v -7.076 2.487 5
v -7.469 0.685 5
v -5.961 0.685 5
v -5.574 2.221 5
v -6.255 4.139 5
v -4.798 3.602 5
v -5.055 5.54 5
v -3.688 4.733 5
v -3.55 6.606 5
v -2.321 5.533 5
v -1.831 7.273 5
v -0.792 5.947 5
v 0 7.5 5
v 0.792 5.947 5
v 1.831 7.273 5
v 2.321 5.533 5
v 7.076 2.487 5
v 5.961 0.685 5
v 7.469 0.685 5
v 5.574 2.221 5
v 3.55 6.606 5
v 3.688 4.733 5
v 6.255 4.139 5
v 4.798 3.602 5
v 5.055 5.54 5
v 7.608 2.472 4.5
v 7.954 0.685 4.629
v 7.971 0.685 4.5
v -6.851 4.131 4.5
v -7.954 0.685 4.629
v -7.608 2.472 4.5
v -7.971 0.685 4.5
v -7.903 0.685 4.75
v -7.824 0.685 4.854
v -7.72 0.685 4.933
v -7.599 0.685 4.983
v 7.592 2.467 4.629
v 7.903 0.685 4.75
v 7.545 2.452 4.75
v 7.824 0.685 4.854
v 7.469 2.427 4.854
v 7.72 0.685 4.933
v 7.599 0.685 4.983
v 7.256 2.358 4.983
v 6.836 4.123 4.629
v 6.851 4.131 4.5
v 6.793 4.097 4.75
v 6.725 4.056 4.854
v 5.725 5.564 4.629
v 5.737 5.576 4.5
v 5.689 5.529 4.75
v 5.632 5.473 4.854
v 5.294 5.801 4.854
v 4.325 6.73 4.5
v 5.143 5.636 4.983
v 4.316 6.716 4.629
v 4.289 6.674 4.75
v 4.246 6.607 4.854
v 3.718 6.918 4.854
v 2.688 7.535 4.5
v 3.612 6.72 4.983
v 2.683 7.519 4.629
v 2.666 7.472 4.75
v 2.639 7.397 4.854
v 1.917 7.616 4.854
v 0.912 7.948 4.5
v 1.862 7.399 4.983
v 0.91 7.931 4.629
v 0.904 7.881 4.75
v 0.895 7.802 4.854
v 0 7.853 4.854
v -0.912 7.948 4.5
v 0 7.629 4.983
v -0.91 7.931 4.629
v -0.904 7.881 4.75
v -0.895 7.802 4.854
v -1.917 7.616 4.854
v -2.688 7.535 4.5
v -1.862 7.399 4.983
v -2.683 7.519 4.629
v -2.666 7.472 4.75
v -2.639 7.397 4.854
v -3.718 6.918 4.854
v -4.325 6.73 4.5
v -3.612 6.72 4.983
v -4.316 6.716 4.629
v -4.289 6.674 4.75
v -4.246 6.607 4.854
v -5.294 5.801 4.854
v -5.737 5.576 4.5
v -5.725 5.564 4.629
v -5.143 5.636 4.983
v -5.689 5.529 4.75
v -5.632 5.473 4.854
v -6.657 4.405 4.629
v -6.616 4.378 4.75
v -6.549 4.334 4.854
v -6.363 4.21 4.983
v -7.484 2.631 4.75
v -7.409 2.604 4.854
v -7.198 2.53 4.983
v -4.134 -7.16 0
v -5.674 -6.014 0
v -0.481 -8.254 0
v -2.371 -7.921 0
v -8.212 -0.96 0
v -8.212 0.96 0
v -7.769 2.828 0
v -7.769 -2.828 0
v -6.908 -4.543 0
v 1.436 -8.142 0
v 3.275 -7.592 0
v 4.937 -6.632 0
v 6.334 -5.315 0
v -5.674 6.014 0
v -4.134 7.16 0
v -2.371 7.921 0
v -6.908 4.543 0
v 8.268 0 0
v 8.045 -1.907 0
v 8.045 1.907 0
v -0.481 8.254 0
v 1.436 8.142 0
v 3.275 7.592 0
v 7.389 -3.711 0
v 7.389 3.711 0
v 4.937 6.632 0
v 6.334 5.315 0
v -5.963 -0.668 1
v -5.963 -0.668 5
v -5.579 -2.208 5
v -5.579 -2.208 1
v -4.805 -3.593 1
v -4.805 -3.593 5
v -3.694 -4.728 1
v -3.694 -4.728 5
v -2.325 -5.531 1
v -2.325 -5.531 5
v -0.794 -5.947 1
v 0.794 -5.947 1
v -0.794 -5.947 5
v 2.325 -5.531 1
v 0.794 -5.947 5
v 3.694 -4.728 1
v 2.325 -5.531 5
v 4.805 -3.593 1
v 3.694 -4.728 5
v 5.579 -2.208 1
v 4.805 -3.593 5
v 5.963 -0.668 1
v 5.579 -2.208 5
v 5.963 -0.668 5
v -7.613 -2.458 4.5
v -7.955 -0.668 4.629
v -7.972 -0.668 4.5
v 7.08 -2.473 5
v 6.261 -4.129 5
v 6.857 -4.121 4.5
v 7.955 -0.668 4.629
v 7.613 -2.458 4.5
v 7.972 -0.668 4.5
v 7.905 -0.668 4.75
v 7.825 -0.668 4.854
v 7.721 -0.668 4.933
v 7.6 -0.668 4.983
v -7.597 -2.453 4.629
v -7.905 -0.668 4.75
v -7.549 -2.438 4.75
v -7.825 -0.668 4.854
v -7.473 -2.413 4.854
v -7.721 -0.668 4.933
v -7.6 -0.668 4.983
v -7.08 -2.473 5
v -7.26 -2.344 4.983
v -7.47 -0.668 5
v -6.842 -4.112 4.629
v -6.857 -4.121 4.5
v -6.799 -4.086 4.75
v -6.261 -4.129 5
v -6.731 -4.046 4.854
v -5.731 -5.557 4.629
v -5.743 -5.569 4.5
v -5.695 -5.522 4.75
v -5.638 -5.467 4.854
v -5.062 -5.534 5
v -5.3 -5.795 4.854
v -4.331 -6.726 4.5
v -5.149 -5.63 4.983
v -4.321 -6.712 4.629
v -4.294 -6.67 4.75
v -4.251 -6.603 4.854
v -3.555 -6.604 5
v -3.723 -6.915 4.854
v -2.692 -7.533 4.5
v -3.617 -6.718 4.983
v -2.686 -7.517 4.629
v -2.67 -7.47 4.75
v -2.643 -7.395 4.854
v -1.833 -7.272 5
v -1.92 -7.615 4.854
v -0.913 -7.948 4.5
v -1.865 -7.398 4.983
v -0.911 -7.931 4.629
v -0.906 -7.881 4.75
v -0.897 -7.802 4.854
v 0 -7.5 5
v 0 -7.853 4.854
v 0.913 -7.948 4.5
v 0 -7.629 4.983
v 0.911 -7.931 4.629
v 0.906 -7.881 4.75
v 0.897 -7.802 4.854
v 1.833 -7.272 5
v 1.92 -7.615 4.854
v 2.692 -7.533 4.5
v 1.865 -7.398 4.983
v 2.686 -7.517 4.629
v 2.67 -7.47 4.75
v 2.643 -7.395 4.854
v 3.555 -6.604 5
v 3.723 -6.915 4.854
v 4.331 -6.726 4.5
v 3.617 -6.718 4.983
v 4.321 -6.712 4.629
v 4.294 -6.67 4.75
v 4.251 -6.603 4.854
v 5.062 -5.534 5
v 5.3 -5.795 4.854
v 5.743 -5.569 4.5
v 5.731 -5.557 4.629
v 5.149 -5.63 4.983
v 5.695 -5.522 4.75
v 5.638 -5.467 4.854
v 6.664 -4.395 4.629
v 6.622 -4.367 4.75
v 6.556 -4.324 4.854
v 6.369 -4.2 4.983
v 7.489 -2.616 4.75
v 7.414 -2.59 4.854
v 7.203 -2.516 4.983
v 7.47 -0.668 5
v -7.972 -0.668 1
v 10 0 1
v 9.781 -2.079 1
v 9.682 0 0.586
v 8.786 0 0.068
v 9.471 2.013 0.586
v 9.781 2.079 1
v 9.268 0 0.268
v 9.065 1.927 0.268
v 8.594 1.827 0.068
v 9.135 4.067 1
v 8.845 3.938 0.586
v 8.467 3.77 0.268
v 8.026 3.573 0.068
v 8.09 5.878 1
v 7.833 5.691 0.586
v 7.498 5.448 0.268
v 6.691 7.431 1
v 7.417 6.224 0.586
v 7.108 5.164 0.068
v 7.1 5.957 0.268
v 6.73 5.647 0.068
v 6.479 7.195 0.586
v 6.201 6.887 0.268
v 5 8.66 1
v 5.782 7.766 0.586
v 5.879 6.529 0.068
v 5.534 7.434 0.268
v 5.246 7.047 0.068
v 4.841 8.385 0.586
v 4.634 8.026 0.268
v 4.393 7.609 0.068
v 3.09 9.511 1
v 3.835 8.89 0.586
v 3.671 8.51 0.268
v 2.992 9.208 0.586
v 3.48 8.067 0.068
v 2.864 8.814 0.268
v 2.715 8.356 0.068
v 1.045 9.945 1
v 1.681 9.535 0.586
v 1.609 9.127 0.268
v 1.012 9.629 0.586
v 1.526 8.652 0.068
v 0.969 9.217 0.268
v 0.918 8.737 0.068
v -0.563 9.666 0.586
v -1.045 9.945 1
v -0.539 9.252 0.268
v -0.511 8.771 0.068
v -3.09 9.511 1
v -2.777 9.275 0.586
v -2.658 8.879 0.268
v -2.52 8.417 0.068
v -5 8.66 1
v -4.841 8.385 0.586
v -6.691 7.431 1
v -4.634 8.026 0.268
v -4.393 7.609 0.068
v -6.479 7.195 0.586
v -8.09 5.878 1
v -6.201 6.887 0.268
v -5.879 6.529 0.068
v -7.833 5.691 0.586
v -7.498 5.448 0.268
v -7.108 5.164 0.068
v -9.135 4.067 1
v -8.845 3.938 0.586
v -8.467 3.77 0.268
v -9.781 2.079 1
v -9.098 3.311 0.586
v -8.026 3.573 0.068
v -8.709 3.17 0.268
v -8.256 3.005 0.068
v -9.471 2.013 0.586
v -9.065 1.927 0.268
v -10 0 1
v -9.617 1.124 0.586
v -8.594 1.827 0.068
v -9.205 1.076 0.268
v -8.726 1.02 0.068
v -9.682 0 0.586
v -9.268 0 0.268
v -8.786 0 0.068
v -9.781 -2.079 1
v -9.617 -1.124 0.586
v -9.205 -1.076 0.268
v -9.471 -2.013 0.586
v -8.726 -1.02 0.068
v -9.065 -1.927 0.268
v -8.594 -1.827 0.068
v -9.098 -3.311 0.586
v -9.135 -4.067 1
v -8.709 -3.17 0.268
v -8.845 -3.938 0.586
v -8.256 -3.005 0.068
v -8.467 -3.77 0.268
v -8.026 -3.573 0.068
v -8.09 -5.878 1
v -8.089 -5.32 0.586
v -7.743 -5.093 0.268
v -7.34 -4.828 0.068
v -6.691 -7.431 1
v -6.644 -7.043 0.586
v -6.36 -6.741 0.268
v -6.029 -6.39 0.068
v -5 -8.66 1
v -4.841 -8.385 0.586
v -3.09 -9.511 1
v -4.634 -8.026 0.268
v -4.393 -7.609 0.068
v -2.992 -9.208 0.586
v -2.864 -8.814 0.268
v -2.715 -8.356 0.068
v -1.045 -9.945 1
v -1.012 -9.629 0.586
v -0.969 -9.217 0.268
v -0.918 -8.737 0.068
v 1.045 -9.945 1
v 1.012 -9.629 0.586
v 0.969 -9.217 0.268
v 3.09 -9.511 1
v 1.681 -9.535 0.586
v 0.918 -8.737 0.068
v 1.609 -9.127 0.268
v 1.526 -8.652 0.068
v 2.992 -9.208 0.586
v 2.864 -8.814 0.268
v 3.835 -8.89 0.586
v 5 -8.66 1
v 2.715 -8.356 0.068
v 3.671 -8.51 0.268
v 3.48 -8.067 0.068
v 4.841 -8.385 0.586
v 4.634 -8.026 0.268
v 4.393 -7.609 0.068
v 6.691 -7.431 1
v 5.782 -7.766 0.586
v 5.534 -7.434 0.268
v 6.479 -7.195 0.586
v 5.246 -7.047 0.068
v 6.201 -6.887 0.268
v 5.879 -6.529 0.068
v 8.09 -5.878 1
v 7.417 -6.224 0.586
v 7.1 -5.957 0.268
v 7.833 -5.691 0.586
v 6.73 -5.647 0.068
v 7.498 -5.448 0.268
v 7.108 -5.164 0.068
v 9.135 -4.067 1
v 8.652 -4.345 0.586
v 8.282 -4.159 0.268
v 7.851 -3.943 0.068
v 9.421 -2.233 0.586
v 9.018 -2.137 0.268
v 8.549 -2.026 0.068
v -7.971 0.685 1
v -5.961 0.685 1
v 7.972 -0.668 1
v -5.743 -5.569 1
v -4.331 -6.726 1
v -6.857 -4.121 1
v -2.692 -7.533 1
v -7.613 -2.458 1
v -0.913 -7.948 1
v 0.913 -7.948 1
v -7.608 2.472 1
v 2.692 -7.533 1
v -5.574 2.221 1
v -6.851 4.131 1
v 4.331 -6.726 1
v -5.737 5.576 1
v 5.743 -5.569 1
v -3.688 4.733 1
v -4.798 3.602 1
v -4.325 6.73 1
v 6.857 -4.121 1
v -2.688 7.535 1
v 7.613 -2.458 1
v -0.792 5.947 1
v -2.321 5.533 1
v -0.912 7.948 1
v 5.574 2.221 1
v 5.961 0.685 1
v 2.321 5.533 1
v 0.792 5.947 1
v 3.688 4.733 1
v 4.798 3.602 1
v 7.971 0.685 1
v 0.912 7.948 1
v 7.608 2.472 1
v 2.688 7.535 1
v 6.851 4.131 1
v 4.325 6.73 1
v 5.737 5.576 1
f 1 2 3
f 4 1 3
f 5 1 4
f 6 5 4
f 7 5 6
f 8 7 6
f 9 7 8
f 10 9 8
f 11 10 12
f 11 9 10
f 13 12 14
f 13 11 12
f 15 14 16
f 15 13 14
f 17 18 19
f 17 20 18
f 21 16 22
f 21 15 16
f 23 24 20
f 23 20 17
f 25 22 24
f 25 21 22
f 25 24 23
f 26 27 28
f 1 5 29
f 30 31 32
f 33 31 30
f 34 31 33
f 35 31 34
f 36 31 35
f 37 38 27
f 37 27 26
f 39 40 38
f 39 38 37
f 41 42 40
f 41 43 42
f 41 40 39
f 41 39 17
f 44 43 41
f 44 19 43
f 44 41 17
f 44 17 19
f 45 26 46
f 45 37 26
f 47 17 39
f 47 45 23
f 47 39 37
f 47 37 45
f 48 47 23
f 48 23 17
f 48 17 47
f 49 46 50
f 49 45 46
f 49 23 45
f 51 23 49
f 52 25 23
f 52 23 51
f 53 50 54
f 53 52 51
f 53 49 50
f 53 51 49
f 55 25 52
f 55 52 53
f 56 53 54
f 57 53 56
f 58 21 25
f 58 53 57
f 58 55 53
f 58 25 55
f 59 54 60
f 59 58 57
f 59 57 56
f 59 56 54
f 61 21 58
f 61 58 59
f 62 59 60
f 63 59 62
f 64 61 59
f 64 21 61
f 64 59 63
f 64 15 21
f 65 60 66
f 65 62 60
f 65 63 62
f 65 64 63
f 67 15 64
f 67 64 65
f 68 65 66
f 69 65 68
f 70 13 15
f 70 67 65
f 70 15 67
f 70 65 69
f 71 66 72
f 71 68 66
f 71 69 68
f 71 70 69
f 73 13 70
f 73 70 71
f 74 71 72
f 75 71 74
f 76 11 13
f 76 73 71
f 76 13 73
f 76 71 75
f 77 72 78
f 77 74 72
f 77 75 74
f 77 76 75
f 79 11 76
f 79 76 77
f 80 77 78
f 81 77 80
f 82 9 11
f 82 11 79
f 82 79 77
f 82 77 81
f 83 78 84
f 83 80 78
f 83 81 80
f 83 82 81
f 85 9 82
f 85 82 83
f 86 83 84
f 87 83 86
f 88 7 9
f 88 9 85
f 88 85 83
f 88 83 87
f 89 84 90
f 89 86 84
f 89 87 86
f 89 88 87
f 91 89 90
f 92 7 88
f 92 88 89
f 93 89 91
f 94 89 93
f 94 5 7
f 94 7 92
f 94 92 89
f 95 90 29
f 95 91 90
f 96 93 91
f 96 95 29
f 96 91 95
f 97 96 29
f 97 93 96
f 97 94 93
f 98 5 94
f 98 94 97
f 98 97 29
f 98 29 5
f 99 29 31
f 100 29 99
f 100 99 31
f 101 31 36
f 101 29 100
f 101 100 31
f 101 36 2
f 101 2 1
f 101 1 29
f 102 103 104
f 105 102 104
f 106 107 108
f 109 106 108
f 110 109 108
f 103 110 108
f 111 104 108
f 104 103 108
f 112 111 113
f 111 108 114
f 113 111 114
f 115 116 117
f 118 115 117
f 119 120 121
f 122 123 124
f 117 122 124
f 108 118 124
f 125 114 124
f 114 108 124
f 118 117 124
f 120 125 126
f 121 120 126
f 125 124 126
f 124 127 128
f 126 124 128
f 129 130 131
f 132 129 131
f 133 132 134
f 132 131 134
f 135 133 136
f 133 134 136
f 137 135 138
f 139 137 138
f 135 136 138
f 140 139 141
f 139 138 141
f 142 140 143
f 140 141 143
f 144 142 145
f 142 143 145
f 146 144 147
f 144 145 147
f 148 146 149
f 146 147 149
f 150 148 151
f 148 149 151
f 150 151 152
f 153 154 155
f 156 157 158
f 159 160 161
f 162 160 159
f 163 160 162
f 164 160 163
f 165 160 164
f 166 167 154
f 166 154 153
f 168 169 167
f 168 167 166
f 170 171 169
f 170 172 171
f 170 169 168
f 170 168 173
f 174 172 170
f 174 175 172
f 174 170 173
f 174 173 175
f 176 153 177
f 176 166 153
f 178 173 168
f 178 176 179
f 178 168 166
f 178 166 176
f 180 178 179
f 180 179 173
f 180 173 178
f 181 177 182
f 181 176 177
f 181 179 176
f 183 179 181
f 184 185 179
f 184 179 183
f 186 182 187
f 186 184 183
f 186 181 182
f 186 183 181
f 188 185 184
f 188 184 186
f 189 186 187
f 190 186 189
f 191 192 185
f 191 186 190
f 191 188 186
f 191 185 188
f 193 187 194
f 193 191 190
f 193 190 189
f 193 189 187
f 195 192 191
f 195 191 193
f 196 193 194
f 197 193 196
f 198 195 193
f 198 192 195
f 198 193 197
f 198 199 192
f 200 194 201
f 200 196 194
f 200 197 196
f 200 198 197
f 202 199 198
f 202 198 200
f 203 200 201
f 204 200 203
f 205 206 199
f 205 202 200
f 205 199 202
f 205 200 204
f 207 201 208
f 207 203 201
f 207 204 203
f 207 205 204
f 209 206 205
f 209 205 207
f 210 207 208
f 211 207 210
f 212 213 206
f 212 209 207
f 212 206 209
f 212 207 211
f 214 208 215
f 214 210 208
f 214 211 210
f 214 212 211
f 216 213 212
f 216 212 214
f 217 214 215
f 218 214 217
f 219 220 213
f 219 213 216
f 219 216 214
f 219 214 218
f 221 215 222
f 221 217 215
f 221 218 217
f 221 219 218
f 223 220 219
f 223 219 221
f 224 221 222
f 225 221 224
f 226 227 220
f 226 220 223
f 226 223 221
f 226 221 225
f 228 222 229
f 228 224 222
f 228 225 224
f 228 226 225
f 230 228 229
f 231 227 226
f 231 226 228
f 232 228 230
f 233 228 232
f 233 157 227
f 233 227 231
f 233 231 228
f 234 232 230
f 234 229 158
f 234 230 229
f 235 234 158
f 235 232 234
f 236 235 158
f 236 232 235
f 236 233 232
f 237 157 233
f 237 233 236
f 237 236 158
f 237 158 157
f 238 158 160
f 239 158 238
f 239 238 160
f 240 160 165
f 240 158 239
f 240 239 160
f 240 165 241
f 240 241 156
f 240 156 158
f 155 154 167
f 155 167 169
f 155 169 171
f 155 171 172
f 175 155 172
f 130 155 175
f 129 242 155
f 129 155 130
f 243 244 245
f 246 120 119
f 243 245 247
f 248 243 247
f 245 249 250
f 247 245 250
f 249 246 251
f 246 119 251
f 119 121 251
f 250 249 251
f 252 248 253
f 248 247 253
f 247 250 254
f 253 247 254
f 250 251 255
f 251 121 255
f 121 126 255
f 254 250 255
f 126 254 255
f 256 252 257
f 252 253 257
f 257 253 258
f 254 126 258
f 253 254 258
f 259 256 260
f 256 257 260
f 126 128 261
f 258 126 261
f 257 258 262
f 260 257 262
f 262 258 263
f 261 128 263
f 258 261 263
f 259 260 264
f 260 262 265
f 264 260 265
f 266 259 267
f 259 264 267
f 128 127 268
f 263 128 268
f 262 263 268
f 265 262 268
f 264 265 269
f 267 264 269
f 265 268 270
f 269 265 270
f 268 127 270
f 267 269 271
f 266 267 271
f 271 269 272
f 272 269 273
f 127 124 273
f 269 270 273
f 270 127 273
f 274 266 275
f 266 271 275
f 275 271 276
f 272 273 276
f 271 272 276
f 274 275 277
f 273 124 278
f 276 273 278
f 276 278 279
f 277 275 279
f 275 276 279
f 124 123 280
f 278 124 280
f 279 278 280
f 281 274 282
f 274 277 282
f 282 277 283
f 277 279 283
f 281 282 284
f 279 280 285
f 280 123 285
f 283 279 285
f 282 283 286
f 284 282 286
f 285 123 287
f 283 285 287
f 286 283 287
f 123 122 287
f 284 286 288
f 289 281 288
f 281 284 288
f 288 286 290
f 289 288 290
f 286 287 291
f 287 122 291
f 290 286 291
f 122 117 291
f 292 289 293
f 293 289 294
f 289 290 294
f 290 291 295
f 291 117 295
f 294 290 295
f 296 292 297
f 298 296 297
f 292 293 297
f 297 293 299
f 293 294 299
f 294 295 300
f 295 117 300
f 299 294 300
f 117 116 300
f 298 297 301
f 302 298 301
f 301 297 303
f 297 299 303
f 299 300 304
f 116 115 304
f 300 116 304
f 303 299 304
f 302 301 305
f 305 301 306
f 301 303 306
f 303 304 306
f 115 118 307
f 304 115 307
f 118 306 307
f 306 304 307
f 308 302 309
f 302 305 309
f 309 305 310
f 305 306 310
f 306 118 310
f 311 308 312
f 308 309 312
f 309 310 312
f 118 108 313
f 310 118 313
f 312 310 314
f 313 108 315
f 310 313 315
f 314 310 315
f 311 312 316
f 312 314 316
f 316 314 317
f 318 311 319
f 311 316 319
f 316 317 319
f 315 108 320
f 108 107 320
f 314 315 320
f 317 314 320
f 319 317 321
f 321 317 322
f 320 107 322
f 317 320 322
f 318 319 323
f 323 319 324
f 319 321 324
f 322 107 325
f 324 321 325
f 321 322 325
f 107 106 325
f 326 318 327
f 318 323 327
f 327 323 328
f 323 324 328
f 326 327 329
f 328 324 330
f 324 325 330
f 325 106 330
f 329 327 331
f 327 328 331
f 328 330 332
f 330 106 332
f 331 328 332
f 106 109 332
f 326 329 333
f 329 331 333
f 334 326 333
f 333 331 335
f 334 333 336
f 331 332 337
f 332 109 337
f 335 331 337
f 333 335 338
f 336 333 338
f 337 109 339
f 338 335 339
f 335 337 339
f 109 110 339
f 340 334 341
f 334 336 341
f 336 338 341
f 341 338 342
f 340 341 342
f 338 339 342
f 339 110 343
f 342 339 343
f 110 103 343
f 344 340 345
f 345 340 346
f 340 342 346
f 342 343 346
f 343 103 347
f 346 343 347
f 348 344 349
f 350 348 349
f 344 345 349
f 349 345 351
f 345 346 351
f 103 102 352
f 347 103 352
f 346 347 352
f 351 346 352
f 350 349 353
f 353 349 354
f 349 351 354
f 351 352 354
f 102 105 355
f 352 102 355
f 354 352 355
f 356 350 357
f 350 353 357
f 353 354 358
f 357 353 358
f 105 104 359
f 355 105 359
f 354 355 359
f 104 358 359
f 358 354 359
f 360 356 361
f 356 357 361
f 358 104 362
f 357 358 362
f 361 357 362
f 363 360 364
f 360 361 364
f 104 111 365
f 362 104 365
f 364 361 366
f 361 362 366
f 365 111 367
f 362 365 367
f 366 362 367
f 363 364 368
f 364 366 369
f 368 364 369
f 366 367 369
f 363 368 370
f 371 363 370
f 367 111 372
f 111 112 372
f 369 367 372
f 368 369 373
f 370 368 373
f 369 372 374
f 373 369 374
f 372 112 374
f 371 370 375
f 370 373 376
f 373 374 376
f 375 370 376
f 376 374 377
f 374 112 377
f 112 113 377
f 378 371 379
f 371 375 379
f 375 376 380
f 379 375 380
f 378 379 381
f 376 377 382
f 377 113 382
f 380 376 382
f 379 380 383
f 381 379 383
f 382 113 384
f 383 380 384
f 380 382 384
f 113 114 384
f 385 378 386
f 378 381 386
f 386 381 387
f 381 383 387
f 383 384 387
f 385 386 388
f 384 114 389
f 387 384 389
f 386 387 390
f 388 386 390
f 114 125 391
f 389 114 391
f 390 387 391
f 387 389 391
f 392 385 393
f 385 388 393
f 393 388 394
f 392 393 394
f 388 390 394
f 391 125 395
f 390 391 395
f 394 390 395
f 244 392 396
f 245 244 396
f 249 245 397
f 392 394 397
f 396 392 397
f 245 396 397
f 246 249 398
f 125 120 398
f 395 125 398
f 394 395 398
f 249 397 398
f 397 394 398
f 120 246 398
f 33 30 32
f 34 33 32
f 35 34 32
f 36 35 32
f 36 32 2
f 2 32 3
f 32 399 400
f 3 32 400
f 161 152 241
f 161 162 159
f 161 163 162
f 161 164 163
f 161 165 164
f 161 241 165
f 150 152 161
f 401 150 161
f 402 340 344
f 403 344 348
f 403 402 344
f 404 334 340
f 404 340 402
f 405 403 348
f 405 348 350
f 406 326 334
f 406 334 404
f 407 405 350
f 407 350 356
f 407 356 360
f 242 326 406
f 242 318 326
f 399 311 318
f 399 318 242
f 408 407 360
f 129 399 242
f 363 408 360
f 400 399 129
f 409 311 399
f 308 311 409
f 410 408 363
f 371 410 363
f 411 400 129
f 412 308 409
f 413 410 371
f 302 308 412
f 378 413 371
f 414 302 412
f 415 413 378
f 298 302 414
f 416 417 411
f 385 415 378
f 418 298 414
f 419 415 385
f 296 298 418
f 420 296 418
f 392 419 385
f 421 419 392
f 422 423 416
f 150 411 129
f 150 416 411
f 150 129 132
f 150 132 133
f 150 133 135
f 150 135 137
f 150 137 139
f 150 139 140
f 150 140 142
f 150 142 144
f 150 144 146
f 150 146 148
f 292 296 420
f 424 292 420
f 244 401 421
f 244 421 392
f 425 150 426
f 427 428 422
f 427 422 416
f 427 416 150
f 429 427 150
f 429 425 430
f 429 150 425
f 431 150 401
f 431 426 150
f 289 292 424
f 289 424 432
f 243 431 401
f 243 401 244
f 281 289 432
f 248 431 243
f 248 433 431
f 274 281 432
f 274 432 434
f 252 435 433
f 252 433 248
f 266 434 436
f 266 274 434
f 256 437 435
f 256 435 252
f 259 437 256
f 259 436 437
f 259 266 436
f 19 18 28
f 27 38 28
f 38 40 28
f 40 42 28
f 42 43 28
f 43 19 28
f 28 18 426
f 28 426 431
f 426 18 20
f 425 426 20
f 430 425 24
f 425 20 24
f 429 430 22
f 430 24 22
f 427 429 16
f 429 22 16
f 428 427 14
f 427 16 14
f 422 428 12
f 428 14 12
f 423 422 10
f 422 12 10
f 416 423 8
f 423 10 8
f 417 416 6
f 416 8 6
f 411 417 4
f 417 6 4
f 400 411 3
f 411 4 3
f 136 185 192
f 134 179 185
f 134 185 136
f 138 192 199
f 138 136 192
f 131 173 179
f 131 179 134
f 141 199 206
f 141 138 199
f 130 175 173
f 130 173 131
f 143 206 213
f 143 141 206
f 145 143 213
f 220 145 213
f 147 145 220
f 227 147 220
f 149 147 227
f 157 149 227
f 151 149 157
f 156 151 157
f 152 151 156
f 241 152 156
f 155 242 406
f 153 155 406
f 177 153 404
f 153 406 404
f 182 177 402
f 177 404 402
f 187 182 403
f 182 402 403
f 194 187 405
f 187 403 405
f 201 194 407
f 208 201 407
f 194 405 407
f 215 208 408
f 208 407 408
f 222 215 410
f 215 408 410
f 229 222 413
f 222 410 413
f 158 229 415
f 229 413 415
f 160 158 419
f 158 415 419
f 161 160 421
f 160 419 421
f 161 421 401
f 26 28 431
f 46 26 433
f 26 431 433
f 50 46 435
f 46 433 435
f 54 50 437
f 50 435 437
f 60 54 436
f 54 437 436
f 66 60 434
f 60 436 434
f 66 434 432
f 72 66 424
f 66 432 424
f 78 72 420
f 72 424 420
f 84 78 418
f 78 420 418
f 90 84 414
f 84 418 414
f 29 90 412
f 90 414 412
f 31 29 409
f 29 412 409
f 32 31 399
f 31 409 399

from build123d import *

# Parameters (mm, degrees)
F0_R     = 10
F1_DEPTH = 1
F3_R     = 8
F4_DEPTH = 4
F5_R     = 6
F6_DEPTH = 4
F7_W     = 17.3227433115
F7_H     = 1.3524350361
F8_DEPTH = 25
F9_R     = 0.5


# Not quite as in the source:
# - a fillet or chamfer that OpenCascade refuses, or shapes differently, is made with other operations: its cross-section is extruded or revolved along the edge and cut away or added


with BuildPart() as f1:
    # F0 (on Top) → F1 (new body)
    with BuildSketch(Plane.XY):
        Circle(F0_R)
    extrude(amount=F1_DEPTH)

    # F2: fillet of radius 2 on 1 edges, made by hand

    # F2_s1 → F2_t2 (revolve, cut)
    with BuildSketch(Plane.XZ):
        with BuildLine():
            ThreePointArc((10, 1), (9.2679491924, 0.2679491924), (8.2679491924, 0))
            Line((8.2679491924, 0), (10, 0))
            Line((10, 0), (10, 1))
        make_face()
    revolve(axis=Axis((0, 0, 0), (0, 0, 1)), mode=Mode.SUBTRACT)

    # F3 (on face) → F4 (join)
    with BuildSketch(Plane.XY.offset(1)):
        Circle(F3_R)
    extrude(amount=F4_DEPTH)

    # F5 (on face) → F6 (cut)
    with BuildSketch(Plane.XY.offset(5)):
        Circle(F5_R)
    extrude(amount=-F6_DEPTH, mode=Mode.SUBTRACT)

    # F7 (on face) → F8 (cut)
    with BuildSketch(Plane.XY.offset(1)):
        with Locations((-0.0975718722, 0.0086750078)):
            Rectangle(F7_W, F7_H)
    extrude(amount=F8_DEPTH, mode=Mode.SUBTRACT)

    # F9
    f9_edges = [f1.edges().sort_by_distance(p)[0] for p in [
        (0, 8, 5),
        (0, -8, 5),
    ]]
    fillet(f9_edges, radius=F9_R)


solid = f1.part
